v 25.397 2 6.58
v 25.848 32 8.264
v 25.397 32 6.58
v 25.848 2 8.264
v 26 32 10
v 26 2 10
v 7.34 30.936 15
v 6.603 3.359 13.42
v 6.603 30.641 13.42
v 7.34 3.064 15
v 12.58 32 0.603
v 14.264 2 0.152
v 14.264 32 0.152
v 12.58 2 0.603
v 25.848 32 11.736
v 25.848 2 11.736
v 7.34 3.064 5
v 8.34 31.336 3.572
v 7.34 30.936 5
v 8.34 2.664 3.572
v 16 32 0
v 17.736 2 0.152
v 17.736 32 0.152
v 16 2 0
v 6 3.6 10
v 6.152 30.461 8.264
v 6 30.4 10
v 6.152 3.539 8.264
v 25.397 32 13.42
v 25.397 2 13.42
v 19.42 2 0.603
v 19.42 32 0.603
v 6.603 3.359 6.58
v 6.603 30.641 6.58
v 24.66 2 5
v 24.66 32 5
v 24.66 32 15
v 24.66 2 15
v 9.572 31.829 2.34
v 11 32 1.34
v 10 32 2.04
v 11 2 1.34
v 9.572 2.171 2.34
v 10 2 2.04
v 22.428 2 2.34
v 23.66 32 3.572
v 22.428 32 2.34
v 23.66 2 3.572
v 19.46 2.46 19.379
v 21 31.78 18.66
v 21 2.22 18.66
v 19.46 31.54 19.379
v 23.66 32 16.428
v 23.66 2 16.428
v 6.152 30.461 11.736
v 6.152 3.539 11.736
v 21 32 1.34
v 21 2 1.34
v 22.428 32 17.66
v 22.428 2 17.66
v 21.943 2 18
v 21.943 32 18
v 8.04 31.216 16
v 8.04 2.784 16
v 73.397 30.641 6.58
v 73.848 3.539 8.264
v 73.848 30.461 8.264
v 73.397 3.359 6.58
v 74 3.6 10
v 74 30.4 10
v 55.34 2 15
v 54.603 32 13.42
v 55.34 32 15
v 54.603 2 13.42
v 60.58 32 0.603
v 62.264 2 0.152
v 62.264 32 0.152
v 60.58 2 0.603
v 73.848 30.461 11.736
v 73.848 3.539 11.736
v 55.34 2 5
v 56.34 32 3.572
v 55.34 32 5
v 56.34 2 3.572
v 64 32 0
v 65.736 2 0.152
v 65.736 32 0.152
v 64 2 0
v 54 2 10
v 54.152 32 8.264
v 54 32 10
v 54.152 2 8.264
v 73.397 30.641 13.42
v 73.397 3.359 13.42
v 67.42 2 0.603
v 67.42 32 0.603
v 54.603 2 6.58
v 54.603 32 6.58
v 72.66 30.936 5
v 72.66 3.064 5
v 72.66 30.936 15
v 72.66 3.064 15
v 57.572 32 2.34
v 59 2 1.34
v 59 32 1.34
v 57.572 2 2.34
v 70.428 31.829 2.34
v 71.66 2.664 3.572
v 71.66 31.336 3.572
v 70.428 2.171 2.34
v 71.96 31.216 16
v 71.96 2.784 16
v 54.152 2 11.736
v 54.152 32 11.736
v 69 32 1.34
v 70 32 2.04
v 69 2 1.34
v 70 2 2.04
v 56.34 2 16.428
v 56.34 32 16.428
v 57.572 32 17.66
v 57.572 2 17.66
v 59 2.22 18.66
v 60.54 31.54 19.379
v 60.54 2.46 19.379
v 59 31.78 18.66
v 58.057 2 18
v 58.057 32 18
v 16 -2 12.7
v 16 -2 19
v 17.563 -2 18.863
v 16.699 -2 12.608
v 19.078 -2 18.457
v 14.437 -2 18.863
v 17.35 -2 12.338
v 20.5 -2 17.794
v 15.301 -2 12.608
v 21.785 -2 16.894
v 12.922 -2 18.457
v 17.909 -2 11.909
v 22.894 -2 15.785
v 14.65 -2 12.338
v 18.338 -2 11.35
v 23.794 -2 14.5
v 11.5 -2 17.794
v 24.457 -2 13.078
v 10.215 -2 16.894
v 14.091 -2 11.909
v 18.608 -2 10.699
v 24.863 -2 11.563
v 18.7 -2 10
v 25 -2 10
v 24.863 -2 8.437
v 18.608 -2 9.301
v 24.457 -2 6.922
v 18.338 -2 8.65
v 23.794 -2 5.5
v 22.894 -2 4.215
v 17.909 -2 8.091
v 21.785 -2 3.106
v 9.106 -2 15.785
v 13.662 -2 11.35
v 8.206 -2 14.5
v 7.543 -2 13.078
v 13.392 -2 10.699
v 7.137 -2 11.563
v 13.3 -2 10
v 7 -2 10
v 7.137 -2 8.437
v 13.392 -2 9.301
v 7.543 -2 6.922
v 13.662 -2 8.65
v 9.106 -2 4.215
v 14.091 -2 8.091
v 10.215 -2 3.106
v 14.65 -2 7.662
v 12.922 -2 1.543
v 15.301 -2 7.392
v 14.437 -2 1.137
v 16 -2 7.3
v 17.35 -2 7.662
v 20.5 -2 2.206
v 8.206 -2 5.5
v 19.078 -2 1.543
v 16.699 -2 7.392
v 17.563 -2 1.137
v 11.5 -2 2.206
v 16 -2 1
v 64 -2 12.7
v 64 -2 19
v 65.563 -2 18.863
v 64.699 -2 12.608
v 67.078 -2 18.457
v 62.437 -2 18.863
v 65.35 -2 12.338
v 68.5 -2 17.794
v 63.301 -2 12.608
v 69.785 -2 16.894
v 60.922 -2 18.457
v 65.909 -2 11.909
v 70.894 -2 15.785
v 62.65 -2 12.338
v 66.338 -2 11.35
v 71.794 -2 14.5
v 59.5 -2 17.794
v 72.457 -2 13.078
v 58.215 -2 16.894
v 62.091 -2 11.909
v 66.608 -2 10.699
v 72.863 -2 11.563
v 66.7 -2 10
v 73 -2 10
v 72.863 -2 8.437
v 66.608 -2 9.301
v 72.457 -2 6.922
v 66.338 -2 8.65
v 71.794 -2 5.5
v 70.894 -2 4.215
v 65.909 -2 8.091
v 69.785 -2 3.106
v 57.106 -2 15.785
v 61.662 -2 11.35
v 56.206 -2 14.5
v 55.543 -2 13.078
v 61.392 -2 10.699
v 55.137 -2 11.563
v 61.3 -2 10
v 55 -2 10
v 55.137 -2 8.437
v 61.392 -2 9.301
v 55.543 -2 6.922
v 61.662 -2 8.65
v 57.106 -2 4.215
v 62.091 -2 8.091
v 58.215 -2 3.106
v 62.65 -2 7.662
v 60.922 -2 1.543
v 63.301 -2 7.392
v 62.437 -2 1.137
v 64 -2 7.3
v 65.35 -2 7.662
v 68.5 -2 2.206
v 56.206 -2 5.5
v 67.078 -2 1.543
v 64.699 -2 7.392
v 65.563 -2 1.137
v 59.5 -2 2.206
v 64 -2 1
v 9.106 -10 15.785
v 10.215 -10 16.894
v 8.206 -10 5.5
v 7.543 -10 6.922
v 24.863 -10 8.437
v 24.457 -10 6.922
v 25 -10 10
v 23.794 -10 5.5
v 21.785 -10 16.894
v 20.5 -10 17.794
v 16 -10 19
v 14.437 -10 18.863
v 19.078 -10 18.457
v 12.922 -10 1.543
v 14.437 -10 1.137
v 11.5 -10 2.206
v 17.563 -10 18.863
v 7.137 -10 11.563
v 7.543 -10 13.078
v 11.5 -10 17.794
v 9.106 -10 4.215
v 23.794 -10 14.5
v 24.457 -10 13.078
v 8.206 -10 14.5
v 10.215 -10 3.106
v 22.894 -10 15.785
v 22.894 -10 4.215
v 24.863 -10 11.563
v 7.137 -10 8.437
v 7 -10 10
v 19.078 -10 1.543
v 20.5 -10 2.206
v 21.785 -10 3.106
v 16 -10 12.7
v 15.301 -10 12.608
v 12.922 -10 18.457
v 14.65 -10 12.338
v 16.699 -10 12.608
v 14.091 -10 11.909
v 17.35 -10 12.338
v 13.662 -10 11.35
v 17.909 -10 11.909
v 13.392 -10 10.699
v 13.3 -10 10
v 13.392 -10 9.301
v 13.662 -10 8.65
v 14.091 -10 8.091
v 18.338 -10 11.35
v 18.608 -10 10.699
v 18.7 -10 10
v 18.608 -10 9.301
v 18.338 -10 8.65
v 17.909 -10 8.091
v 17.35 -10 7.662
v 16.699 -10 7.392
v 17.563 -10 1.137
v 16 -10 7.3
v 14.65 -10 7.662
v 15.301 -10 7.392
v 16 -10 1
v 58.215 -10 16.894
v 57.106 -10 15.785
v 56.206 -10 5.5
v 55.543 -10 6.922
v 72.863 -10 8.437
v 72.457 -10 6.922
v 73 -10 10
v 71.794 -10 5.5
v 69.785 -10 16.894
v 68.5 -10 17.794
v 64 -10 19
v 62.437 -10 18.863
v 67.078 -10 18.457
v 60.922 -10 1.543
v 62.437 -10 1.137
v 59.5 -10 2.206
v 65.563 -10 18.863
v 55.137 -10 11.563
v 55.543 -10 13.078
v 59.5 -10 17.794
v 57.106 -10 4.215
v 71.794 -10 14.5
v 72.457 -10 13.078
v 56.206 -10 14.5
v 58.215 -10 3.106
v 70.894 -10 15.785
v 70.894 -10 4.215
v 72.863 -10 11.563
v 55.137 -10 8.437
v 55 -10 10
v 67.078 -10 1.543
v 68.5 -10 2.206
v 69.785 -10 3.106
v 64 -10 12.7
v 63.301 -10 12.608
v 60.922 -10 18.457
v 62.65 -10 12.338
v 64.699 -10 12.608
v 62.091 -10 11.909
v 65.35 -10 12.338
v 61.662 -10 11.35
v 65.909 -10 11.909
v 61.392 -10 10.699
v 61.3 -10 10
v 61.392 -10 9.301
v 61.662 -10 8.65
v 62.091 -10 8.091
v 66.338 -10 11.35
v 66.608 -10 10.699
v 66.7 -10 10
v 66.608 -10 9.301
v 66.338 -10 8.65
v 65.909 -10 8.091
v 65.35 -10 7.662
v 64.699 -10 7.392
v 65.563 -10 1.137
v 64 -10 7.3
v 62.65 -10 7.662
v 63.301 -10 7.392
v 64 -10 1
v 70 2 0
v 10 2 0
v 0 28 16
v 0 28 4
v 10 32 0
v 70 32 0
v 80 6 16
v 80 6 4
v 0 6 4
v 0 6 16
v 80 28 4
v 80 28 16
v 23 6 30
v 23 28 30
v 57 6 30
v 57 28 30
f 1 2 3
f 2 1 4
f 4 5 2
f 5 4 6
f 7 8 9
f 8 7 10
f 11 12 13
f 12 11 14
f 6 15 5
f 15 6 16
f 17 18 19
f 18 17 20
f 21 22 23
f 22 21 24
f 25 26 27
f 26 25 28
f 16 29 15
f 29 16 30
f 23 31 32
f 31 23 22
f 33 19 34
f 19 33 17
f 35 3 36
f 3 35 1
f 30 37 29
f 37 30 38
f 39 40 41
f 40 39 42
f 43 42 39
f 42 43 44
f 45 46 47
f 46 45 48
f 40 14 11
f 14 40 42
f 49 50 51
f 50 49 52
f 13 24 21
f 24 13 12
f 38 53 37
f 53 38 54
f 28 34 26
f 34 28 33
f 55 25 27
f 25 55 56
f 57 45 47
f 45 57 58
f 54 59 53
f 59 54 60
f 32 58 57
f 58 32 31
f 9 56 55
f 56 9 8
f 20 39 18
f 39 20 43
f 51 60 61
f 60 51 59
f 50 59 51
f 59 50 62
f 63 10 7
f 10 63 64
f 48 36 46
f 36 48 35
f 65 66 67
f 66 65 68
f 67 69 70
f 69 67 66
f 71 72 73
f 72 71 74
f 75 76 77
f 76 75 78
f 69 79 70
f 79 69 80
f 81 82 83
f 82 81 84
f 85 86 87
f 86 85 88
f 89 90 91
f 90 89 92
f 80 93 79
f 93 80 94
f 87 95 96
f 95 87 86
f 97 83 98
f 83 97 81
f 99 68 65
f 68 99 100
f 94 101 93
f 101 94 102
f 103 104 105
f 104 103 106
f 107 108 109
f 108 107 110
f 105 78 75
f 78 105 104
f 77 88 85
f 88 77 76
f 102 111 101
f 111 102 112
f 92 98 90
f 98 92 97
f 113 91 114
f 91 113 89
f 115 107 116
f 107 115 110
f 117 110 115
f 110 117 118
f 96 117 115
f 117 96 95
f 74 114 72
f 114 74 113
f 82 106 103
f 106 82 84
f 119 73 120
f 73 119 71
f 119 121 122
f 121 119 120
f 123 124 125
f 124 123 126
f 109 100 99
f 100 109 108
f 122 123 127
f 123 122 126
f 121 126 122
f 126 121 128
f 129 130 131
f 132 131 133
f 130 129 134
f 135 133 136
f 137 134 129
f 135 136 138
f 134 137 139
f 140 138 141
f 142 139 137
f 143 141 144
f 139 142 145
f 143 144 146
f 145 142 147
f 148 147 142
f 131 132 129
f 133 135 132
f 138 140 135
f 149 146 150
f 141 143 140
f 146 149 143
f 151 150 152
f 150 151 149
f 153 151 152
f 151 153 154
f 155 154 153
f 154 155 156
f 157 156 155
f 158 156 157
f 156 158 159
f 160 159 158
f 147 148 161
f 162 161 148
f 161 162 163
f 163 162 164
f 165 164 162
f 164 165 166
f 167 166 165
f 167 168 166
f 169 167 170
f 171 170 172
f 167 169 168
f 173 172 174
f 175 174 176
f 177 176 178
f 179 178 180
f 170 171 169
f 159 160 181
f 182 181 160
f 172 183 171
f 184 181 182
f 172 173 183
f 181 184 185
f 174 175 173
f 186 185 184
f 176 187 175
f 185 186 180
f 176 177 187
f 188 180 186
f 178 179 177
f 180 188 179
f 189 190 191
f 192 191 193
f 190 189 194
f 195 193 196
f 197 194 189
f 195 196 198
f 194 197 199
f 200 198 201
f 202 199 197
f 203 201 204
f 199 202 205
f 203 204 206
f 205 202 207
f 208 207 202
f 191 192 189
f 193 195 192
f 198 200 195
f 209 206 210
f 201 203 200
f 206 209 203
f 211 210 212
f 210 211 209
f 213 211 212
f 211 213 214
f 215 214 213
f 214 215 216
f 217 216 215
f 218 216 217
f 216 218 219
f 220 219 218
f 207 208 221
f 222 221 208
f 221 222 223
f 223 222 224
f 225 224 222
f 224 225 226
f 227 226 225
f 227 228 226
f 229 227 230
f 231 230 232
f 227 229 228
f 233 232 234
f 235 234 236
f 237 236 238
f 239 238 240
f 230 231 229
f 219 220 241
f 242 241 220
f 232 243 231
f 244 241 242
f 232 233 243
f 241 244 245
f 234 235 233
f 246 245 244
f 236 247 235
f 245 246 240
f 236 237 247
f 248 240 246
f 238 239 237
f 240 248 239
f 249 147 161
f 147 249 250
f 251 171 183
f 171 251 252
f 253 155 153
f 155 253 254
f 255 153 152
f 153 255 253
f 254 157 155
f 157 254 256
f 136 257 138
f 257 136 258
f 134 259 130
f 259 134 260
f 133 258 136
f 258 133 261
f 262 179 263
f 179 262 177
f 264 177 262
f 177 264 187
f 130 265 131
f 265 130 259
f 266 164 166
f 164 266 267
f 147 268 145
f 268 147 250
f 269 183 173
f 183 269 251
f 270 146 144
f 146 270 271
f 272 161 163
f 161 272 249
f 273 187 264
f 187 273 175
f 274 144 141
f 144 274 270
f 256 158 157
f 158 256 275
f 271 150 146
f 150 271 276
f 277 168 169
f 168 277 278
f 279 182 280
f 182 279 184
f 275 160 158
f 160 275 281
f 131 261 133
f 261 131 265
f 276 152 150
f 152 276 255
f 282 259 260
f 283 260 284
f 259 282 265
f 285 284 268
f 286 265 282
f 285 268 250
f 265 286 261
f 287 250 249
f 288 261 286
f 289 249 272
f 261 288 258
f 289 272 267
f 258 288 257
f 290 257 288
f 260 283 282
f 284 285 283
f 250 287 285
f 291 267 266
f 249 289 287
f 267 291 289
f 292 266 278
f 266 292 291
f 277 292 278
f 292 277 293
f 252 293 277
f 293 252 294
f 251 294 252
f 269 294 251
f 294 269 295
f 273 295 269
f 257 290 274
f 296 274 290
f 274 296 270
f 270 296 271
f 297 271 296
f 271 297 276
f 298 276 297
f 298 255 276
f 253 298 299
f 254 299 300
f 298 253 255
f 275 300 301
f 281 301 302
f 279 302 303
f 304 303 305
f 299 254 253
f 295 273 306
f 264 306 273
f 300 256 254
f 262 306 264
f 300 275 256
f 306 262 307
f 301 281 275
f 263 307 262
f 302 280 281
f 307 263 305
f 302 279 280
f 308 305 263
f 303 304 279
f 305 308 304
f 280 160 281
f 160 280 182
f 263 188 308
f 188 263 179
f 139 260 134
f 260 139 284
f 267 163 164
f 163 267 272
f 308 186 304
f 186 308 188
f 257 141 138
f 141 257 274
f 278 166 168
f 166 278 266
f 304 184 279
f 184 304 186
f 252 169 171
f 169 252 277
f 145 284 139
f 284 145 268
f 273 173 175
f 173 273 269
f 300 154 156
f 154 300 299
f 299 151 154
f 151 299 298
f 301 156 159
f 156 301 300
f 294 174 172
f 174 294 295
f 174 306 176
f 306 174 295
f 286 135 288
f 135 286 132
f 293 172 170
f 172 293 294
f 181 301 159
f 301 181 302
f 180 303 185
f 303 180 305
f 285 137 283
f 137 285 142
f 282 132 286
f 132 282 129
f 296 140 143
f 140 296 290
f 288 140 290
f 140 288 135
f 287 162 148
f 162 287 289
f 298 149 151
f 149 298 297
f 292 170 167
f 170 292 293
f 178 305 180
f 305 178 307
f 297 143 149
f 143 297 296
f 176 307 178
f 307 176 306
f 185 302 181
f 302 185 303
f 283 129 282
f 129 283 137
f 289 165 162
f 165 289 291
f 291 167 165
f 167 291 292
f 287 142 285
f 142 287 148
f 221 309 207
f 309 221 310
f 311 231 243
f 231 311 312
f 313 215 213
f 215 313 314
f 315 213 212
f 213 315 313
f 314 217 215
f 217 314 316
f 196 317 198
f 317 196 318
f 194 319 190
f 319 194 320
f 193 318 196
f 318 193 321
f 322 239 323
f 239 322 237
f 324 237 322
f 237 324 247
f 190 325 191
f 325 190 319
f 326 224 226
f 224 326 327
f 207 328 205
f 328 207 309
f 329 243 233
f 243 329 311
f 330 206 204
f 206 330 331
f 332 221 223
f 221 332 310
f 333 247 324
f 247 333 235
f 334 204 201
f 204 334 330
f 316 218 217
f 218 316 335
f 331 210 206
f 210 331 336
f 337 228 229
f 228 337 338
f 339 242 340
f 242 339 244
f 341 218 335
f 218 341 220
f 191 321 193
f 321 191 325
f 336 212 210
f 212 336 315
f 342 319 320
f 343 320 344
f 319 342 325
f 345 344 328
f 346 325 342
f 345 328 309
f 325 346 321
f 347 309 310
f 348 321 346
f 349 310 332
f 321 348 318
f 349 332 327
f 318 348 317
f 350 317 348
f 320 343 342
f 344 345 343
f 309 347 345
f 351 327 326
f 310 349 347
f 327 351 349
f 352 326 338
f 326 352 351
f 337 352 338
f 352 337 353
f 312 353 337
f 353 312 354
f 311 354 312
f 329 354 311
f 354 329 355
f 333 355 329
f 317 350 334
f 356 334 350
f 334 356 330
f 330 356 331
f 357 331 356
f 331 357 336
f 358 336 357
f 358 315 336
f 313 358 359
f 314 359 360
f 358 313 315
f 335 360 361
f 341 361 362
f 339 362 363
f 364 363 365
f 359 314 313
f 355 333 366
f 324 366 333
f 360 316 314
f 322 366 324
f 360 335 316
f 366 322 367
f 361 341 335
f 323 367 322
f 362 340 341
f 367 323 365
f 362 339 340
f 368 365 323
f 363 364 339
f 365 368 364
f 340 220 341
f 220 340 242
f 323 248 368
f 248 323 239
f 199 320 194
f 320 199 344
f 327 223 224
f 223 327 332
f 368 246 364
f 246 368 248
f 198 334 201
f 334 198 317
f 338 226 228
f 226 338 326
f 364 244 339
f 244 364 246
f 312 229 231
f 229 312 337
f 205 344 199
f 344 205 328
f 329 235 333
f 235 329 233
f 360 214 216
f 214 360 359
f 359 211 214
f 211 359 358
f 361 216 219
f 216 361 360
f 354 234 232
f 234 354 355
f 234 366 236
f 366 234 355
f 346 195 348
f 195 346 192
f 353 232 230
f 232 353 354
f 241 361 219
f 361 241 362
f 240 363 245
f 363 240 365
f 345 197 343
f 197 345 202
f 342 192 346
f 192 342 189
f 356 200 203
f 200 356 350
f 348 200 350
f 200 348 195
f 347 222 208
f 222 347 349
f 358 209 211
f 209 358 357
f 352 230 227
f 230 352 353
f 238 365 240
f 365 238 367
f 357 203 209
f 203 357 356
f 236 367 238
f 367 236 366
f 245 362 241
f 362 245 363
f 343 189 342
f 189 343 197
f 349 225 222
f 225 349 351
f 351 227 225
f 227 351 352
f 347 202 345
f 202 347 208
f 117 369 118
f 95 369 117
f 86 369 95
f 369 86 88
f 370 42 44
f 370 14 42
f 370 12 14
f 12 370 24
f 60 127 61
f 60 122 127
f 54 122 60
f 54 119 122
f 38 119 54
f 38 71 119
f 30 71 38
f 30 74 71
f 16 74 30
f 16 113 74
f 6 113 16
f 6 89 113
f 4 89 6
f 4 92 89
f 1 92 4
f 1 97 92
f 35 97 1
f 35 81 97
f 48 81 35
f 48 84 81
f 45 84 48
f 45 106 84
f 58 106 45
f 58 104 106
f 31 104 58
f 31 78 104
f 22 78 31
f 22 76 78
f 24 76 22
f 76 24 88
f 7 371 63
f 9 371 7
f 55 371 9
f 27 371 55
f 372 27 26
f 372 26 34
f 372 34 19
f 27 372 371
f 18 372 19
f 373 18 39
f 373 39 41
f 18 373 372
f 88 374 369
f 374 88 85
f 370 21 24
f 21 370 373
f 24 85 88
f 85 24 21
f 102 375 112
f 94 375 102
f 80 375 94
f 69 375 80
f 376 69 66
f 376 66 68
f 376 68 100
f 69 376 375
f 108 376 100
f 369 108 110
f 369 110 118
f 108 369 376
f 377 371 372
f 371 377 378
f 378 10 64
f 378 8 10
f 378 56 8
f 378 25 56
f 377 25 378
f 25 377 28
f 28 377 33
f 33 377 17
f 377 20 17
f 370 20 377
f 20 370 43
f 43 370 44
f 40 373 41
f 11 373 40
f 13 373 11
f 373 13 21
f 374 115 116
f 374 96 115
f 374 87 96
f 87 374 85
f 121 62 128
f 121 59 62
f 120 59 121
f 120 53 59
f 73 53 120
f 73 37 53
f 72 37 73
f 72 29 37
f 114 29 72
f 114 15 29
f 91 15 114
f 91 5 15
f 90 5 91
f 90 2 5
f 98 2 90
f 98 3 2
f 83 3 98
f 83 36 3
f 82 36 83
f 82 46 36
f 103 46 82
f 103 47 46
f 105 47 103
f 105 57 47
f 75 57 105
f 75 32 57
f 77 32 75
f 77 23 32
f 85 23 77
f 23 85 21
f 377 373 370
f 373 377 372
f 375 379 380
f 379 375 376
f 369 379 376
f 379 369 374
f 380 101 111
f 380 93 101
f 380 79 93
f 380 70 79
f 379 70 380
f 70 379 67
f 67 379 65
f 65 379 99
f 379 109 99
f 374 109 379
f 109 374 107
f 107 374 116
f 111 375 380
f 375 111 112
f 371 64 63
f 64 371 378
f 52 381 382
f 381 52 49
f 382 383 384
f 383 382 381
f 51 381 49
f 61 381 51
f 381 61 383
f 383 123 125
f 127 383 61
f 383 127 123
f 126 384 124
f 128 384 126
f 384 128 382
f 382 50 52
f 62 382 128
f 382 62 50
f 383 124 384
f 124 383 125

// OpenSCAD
// Toy Car - Printable in place (no supports, no assembly)
// Print: 0.2mm, 3 walls, 15% infill
// Scale: roughly 1:64 matchbox size

// ─── Dimensions ───────────────────────────────────────────
BODY_L = 80;
BODY_W = 34;
BODY_H = 16;

ROOF_L = 42;
ROOF_W = 30;
ROOF_H = 14;

WHEEL_D = 18;
WHEEL_W = 8;
AXLE_D  = 5;
AXLE_PLAY = 0.4;  // Clearance for rotating wheels

WHEEL_OFFSET_Z = WHEEL_D / 2 + 1;
FRONT_AXLE_X   = 16;
REAR_AXLE_X    = BODY_L - 16;

module body() {
    hull() {
        translate([10, 2, 0]) cube([BODY_L - 20, BODY_W - 4, BODY_H]);
        translate([0, 6, 4]) cube([BODY_L, BODY_W - 12, BODY_H - 4]);
    }
}

module roof() {
    translate([(BODY_L - ROOF_L)/2, (BODY_W - ROOF_W)/2, BODY_H])
        hull() {
            cube([ROOF_L, ROOF_W, 2]);
            translate([4, 4, ROOF_H - 2]) cube([ROOF_L - 8, ROOF_W - 8, 2]);
        }
}

module wheel() {
    difference() {
        union() {
            cylinder(d = WHEEL_D, h = WHEEL_W, $fn = 36);
            translate([0, 0, WHEEL_W/2 - 1])
                cylinder(d = WHEEL_D - 4, h = 2, $fn = 36); // hub detail
        }
        translate([0, 0, -1])
            cylinder(d = AXLE_D + AXLE_PLAY, h = WHEEL_W + 2, $fn = 24);
    }
}

module axle(length) {
    cylinder(d = AXLE_D, h = length, $fn = 20);
}

module car() {
    // Body + roof
    body();
    roof();

    // Wheel arches (cut from body visually — decorative)
    color("gray")
    for (x = [FRONT_AXLE_X, REAR_AXLE_X]) {
        translate([x, -1, WHEEL_OFFSET_Z])
            rotate([-90, 0, 0])
                cylinder(d = WHEEL_D + 2, h = BODY_W + 2, $fn = 36);
    }

    // Axles
    for (x = [FRONT_AXLE_X, REAR_AXLE_X]) {
        translate([x, -2, WHEEL_OFFSET_Z])
            rotate([-90, 0, 0])
                axle(BODY_W + 4);
    }

    // Wheels (left + right, front + rear)
    for (x = [FRONT_AXLE_X, REAR_AXLE_X]) {
        // Left
        translate([x, -2 - WHEEL_W, WHEEL_OFFSET_Z])
            rotate([-90, 0, 0])
                wheel();
        // Right
        translate([x, BODY_W + 2, WHEEL_OFFSET_Z])
            rotate([90, 0, 0])
                wheel();
    }
}

difference() {
    car();
    // Wheel arch cutouts
    for (x = [FRONT_AXLE_X, REAR_AXLE_X]) {
        translate([x, -2, WHEEL_OFFSET_Z])
            rotate([-90, 0, 0])
                cylinder(d = WHEEL_D + 2, h = BODY_W + 4, $fn = 36);
    }
}
